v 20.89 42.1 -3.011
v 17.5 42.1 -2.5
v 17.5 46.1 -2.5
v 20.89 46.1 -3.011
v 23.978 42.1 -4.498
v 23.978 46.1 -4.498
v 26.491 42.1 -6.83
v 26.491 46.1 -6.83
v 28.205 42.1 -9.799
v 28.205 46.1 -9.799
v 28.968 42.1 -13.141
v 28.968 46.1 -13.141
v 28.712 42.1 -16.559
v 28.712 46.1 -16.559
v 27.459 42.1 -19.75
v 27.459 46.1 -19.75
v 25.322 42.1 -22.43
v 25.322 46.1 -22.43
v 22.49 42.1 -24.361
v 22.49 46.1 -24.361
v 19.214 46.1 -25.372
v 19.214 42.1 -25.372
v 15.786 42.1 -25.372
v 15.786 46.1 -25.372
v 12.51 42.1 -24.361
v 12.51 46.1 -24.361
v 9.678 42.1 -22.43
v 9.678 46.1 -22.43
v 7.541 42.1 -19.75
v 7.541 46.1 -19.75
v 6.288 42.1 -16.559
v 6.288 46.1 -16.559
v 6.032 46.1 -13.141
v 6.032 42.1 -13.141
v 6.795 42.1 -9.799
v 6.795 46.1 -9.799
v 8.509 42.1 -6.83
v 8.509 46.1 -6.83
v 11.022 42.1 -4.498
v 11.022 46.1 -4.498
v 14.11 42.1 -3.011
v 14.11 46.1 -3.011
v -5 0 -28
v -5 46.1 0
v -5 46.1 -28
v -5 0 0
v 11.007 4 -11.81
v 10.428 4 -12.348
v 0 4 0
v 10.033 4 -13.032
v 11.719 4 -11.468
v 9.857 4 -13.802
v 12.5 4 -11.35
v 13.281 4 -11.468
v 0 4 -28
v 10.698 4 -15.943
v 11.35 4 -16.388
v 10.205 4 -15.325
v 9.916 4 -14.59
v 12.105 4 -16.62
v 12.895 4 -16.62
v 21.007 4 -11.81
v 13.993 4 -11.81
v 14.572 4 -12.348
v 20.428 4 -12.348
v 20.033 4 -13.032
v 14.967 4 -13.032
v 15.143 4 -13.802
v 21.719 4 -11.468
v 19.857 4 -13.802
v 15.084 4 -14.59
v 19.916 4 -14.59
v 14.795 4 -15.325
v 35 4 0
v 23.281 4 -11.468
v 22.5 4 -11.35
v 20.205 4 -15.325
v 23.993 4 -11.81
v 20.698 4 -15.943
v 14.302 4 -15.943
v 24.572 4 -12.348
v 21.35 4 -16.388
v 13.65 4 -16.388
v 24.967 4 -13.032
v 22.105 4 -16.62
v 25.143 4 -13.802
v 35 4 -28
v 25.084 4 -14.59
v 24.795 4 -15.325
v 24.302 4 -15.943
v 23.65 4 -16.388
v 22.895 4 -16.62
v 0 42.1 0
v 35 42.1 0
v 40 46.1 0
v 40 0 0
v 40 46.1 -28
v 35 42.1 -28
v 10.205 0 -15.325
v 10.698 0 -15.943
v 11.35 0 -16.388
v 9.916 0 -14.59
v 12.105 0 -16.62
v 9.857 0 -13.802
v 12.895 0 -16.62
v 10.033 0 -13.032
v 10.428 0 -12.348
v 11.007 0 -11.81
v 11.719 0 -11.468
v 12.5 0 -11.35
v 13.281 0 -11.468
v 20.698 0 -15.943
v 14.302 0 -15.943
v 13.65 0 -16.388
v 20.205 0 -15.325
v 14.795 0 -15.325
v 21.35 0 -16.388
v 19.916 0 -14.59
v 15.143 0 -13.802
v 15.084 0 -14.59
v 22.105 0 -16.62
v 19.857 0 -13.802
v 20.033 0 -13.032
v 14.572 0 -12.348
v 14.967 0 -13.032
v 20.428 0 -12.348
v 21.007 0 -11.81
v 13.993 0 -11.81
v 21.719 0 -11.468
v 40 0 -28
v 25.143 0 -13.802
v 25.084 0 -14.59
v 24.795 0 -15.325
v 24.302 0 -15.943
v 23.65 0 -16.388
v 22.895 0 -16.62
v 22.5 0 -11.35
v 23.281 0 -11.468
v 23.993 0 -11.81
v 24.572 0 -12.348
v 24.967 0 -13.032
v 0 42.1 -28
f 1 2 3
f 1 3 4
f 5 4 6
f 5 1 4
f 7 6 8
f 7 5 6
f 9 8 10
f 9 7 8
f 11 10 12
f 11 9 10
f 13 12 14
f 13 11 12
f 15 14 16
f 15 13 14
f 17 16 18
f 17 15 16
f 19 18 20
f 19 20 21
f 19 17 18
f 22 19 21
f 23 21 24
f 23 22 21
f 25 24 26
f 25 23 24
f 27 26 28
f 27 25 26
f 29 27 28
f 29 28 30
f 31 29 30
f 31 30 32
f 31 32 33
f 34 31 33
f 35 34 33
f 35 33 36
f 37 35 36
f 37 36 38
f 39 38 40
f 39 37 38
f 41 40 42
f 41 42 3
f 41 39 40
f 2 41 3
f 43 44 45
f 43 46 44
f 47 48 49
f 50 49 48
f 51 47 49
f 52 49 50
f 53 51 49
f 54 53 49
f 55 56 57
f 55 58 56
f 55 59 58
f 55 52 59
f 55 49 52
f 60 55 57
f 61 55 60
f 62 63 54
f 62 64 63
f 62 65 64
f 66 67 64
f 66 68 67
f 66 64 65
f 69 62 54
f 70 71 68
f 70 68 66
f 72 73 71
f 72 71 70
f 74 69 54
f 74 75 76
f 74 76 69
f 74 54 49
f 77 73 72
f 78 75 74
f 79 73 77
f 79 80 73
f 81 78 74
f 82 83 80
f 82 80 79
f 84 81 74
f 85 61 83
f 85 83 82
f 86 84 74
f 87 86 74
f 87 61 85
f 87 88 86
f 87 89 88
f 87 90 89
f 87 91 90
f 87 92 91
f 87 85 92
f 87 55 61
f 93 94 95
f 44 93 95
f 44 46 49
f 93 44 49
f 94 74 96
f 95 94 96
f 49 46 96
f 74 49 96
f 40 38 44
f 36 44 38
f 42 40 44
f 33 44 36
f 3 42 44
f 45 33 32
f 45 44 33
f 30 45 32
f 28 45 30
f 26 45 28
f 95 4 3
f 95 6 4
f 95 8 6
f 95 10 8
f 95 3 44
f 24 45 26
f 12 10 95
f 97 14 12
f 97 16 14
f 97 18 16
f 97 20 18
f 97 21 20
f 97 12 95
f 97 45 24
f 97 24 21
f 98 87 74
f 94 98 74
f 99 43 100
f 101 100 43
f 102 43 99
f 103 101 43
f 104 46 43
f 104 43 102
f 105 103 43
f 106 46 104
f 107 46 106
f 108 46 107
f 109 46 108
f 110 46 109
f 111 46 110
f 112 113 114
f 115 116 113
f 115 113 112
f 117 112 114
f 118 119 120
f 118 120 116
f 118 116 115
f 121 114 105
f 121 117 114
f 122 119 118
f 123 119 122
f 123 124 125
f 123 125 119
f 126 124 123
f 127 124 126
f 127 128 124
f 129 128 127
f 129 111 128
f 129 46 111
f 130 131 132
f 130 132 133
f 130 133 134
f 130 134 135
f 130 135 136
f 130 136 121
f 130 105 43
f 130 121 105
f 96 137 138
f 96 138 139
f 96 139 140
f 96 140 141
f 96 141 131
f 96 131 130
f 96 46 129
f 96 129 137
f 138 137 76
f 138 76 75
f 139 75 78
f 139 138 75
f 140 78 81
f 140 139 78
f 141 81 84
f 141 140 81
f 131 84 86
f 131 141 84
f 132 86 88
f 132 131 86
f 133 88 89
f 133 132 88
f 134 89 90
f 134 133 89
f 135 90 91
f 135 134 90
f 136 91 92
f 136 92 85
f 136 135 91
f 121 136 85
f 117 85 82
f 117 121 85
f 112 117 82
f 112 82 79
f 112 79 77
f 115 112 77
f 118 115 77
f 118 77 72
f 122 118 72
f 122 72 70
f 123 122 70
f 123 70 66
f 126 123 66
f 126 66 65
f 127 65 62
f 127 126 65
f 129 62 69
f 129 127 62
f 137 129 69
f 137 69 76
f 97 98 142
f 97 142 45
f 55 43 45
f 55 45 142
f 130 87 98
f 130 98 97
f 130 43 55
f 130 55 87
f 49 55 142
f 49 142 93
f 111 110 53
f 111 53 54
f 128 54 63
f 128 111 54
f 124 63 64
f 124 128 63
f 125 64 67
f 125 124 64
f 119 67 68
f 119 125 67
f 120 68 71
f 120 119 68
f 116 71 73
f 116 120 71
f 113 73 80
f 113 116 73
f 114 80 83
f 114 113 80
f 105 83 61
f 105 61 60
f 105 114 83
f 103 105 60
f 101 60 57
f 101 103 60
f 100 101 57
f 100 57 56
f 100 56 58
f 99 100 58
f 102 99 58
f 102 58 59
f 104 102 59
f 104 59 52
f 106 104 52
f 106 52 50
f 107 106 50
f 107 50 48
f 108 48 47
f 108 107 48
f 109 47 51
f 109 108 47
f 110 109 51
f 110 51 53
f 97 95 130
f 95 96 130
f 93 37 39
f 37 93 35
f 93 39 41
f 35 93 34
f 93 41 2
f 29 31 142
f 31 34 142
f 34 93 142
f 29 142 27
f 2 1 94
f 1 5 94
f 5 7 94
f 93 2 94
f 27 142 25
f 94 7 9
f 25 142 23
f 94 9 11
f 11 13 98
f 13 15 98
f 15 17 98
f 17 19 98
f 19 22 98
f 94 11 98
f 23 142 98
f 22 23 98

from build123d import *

# Parameters (mm, degrees)
SKETCH1_W           = 35
SKETCH1_H           = 28
SKETCH1_R           = 2.65
BOSS_EXTRUDE1_DEPTH = 4
SKETCH2_W           = 5
SKETCH2_H           = 28
BOSS_EXTRUDE2_DEPTH = 42.1
SKETCH3_W           = 45
SKETCH3_H           = 28
SKETCH3_R           = 11.5
BOSS_EXTRUDE3_DEPTH = 4


with BuildPart() as part:
    # Sketch1 → Boss-Extrude1 (new body)
    with BuildSketch(Plane(origin=(0, 0, 0), x_dir=(1, 0, 0), z_dir=(0, 1, 0))):
        with Locations((17.5, 14)):
            Rectangle(SKETCH1_W, SKETCH1_H)
        with Locations(Location((12.5, 14, 0), (0, 0, 270))):
            Circle(SKETCH1_R, mode=Mode.SUBTRACT)
        with Locations(Location((22.5, 14, 0), (0, 0, 270))):
            Circle(SKETCH1_R, mode=Mode.SUBTRACT)
    extrude(amount=BOSS_EXTRUDE1_DEPTH)

    # Sketch2 → Boss-Extrude2 (add)
    with BuildSketch(Plane.XZ):
        with Locations((-2.5, -14)):
            Rectangle(SKETCH2_W, SKETCH2_H)
        with Locations((37.5, -14)):
            Rectangle(SKETCH2_W, SKETCH2_H)
    extrude(amount=-BOSS_EXTRUDE2_DEPTH)

    # Sketch3 → Boss-Extrude3 (add)
    with BuildSketch(Plane(origin=(0, 42.1, 0), x_dir=(1, 0, 0), z_dir=(0, 1, 0))):
        with Locations((17.5, 14)):
            Rectangle(SKETCH3_W, SKETCH3_H)
        with Locations(Location((17.5, 14, 0), (0, 0, 270))):
            Circle(SKETCH3_R, mode=Mode.SUBTRACT)
    extrude(amount=BOSS_EXTRUDE3_DEPTH)


solid = part.part
